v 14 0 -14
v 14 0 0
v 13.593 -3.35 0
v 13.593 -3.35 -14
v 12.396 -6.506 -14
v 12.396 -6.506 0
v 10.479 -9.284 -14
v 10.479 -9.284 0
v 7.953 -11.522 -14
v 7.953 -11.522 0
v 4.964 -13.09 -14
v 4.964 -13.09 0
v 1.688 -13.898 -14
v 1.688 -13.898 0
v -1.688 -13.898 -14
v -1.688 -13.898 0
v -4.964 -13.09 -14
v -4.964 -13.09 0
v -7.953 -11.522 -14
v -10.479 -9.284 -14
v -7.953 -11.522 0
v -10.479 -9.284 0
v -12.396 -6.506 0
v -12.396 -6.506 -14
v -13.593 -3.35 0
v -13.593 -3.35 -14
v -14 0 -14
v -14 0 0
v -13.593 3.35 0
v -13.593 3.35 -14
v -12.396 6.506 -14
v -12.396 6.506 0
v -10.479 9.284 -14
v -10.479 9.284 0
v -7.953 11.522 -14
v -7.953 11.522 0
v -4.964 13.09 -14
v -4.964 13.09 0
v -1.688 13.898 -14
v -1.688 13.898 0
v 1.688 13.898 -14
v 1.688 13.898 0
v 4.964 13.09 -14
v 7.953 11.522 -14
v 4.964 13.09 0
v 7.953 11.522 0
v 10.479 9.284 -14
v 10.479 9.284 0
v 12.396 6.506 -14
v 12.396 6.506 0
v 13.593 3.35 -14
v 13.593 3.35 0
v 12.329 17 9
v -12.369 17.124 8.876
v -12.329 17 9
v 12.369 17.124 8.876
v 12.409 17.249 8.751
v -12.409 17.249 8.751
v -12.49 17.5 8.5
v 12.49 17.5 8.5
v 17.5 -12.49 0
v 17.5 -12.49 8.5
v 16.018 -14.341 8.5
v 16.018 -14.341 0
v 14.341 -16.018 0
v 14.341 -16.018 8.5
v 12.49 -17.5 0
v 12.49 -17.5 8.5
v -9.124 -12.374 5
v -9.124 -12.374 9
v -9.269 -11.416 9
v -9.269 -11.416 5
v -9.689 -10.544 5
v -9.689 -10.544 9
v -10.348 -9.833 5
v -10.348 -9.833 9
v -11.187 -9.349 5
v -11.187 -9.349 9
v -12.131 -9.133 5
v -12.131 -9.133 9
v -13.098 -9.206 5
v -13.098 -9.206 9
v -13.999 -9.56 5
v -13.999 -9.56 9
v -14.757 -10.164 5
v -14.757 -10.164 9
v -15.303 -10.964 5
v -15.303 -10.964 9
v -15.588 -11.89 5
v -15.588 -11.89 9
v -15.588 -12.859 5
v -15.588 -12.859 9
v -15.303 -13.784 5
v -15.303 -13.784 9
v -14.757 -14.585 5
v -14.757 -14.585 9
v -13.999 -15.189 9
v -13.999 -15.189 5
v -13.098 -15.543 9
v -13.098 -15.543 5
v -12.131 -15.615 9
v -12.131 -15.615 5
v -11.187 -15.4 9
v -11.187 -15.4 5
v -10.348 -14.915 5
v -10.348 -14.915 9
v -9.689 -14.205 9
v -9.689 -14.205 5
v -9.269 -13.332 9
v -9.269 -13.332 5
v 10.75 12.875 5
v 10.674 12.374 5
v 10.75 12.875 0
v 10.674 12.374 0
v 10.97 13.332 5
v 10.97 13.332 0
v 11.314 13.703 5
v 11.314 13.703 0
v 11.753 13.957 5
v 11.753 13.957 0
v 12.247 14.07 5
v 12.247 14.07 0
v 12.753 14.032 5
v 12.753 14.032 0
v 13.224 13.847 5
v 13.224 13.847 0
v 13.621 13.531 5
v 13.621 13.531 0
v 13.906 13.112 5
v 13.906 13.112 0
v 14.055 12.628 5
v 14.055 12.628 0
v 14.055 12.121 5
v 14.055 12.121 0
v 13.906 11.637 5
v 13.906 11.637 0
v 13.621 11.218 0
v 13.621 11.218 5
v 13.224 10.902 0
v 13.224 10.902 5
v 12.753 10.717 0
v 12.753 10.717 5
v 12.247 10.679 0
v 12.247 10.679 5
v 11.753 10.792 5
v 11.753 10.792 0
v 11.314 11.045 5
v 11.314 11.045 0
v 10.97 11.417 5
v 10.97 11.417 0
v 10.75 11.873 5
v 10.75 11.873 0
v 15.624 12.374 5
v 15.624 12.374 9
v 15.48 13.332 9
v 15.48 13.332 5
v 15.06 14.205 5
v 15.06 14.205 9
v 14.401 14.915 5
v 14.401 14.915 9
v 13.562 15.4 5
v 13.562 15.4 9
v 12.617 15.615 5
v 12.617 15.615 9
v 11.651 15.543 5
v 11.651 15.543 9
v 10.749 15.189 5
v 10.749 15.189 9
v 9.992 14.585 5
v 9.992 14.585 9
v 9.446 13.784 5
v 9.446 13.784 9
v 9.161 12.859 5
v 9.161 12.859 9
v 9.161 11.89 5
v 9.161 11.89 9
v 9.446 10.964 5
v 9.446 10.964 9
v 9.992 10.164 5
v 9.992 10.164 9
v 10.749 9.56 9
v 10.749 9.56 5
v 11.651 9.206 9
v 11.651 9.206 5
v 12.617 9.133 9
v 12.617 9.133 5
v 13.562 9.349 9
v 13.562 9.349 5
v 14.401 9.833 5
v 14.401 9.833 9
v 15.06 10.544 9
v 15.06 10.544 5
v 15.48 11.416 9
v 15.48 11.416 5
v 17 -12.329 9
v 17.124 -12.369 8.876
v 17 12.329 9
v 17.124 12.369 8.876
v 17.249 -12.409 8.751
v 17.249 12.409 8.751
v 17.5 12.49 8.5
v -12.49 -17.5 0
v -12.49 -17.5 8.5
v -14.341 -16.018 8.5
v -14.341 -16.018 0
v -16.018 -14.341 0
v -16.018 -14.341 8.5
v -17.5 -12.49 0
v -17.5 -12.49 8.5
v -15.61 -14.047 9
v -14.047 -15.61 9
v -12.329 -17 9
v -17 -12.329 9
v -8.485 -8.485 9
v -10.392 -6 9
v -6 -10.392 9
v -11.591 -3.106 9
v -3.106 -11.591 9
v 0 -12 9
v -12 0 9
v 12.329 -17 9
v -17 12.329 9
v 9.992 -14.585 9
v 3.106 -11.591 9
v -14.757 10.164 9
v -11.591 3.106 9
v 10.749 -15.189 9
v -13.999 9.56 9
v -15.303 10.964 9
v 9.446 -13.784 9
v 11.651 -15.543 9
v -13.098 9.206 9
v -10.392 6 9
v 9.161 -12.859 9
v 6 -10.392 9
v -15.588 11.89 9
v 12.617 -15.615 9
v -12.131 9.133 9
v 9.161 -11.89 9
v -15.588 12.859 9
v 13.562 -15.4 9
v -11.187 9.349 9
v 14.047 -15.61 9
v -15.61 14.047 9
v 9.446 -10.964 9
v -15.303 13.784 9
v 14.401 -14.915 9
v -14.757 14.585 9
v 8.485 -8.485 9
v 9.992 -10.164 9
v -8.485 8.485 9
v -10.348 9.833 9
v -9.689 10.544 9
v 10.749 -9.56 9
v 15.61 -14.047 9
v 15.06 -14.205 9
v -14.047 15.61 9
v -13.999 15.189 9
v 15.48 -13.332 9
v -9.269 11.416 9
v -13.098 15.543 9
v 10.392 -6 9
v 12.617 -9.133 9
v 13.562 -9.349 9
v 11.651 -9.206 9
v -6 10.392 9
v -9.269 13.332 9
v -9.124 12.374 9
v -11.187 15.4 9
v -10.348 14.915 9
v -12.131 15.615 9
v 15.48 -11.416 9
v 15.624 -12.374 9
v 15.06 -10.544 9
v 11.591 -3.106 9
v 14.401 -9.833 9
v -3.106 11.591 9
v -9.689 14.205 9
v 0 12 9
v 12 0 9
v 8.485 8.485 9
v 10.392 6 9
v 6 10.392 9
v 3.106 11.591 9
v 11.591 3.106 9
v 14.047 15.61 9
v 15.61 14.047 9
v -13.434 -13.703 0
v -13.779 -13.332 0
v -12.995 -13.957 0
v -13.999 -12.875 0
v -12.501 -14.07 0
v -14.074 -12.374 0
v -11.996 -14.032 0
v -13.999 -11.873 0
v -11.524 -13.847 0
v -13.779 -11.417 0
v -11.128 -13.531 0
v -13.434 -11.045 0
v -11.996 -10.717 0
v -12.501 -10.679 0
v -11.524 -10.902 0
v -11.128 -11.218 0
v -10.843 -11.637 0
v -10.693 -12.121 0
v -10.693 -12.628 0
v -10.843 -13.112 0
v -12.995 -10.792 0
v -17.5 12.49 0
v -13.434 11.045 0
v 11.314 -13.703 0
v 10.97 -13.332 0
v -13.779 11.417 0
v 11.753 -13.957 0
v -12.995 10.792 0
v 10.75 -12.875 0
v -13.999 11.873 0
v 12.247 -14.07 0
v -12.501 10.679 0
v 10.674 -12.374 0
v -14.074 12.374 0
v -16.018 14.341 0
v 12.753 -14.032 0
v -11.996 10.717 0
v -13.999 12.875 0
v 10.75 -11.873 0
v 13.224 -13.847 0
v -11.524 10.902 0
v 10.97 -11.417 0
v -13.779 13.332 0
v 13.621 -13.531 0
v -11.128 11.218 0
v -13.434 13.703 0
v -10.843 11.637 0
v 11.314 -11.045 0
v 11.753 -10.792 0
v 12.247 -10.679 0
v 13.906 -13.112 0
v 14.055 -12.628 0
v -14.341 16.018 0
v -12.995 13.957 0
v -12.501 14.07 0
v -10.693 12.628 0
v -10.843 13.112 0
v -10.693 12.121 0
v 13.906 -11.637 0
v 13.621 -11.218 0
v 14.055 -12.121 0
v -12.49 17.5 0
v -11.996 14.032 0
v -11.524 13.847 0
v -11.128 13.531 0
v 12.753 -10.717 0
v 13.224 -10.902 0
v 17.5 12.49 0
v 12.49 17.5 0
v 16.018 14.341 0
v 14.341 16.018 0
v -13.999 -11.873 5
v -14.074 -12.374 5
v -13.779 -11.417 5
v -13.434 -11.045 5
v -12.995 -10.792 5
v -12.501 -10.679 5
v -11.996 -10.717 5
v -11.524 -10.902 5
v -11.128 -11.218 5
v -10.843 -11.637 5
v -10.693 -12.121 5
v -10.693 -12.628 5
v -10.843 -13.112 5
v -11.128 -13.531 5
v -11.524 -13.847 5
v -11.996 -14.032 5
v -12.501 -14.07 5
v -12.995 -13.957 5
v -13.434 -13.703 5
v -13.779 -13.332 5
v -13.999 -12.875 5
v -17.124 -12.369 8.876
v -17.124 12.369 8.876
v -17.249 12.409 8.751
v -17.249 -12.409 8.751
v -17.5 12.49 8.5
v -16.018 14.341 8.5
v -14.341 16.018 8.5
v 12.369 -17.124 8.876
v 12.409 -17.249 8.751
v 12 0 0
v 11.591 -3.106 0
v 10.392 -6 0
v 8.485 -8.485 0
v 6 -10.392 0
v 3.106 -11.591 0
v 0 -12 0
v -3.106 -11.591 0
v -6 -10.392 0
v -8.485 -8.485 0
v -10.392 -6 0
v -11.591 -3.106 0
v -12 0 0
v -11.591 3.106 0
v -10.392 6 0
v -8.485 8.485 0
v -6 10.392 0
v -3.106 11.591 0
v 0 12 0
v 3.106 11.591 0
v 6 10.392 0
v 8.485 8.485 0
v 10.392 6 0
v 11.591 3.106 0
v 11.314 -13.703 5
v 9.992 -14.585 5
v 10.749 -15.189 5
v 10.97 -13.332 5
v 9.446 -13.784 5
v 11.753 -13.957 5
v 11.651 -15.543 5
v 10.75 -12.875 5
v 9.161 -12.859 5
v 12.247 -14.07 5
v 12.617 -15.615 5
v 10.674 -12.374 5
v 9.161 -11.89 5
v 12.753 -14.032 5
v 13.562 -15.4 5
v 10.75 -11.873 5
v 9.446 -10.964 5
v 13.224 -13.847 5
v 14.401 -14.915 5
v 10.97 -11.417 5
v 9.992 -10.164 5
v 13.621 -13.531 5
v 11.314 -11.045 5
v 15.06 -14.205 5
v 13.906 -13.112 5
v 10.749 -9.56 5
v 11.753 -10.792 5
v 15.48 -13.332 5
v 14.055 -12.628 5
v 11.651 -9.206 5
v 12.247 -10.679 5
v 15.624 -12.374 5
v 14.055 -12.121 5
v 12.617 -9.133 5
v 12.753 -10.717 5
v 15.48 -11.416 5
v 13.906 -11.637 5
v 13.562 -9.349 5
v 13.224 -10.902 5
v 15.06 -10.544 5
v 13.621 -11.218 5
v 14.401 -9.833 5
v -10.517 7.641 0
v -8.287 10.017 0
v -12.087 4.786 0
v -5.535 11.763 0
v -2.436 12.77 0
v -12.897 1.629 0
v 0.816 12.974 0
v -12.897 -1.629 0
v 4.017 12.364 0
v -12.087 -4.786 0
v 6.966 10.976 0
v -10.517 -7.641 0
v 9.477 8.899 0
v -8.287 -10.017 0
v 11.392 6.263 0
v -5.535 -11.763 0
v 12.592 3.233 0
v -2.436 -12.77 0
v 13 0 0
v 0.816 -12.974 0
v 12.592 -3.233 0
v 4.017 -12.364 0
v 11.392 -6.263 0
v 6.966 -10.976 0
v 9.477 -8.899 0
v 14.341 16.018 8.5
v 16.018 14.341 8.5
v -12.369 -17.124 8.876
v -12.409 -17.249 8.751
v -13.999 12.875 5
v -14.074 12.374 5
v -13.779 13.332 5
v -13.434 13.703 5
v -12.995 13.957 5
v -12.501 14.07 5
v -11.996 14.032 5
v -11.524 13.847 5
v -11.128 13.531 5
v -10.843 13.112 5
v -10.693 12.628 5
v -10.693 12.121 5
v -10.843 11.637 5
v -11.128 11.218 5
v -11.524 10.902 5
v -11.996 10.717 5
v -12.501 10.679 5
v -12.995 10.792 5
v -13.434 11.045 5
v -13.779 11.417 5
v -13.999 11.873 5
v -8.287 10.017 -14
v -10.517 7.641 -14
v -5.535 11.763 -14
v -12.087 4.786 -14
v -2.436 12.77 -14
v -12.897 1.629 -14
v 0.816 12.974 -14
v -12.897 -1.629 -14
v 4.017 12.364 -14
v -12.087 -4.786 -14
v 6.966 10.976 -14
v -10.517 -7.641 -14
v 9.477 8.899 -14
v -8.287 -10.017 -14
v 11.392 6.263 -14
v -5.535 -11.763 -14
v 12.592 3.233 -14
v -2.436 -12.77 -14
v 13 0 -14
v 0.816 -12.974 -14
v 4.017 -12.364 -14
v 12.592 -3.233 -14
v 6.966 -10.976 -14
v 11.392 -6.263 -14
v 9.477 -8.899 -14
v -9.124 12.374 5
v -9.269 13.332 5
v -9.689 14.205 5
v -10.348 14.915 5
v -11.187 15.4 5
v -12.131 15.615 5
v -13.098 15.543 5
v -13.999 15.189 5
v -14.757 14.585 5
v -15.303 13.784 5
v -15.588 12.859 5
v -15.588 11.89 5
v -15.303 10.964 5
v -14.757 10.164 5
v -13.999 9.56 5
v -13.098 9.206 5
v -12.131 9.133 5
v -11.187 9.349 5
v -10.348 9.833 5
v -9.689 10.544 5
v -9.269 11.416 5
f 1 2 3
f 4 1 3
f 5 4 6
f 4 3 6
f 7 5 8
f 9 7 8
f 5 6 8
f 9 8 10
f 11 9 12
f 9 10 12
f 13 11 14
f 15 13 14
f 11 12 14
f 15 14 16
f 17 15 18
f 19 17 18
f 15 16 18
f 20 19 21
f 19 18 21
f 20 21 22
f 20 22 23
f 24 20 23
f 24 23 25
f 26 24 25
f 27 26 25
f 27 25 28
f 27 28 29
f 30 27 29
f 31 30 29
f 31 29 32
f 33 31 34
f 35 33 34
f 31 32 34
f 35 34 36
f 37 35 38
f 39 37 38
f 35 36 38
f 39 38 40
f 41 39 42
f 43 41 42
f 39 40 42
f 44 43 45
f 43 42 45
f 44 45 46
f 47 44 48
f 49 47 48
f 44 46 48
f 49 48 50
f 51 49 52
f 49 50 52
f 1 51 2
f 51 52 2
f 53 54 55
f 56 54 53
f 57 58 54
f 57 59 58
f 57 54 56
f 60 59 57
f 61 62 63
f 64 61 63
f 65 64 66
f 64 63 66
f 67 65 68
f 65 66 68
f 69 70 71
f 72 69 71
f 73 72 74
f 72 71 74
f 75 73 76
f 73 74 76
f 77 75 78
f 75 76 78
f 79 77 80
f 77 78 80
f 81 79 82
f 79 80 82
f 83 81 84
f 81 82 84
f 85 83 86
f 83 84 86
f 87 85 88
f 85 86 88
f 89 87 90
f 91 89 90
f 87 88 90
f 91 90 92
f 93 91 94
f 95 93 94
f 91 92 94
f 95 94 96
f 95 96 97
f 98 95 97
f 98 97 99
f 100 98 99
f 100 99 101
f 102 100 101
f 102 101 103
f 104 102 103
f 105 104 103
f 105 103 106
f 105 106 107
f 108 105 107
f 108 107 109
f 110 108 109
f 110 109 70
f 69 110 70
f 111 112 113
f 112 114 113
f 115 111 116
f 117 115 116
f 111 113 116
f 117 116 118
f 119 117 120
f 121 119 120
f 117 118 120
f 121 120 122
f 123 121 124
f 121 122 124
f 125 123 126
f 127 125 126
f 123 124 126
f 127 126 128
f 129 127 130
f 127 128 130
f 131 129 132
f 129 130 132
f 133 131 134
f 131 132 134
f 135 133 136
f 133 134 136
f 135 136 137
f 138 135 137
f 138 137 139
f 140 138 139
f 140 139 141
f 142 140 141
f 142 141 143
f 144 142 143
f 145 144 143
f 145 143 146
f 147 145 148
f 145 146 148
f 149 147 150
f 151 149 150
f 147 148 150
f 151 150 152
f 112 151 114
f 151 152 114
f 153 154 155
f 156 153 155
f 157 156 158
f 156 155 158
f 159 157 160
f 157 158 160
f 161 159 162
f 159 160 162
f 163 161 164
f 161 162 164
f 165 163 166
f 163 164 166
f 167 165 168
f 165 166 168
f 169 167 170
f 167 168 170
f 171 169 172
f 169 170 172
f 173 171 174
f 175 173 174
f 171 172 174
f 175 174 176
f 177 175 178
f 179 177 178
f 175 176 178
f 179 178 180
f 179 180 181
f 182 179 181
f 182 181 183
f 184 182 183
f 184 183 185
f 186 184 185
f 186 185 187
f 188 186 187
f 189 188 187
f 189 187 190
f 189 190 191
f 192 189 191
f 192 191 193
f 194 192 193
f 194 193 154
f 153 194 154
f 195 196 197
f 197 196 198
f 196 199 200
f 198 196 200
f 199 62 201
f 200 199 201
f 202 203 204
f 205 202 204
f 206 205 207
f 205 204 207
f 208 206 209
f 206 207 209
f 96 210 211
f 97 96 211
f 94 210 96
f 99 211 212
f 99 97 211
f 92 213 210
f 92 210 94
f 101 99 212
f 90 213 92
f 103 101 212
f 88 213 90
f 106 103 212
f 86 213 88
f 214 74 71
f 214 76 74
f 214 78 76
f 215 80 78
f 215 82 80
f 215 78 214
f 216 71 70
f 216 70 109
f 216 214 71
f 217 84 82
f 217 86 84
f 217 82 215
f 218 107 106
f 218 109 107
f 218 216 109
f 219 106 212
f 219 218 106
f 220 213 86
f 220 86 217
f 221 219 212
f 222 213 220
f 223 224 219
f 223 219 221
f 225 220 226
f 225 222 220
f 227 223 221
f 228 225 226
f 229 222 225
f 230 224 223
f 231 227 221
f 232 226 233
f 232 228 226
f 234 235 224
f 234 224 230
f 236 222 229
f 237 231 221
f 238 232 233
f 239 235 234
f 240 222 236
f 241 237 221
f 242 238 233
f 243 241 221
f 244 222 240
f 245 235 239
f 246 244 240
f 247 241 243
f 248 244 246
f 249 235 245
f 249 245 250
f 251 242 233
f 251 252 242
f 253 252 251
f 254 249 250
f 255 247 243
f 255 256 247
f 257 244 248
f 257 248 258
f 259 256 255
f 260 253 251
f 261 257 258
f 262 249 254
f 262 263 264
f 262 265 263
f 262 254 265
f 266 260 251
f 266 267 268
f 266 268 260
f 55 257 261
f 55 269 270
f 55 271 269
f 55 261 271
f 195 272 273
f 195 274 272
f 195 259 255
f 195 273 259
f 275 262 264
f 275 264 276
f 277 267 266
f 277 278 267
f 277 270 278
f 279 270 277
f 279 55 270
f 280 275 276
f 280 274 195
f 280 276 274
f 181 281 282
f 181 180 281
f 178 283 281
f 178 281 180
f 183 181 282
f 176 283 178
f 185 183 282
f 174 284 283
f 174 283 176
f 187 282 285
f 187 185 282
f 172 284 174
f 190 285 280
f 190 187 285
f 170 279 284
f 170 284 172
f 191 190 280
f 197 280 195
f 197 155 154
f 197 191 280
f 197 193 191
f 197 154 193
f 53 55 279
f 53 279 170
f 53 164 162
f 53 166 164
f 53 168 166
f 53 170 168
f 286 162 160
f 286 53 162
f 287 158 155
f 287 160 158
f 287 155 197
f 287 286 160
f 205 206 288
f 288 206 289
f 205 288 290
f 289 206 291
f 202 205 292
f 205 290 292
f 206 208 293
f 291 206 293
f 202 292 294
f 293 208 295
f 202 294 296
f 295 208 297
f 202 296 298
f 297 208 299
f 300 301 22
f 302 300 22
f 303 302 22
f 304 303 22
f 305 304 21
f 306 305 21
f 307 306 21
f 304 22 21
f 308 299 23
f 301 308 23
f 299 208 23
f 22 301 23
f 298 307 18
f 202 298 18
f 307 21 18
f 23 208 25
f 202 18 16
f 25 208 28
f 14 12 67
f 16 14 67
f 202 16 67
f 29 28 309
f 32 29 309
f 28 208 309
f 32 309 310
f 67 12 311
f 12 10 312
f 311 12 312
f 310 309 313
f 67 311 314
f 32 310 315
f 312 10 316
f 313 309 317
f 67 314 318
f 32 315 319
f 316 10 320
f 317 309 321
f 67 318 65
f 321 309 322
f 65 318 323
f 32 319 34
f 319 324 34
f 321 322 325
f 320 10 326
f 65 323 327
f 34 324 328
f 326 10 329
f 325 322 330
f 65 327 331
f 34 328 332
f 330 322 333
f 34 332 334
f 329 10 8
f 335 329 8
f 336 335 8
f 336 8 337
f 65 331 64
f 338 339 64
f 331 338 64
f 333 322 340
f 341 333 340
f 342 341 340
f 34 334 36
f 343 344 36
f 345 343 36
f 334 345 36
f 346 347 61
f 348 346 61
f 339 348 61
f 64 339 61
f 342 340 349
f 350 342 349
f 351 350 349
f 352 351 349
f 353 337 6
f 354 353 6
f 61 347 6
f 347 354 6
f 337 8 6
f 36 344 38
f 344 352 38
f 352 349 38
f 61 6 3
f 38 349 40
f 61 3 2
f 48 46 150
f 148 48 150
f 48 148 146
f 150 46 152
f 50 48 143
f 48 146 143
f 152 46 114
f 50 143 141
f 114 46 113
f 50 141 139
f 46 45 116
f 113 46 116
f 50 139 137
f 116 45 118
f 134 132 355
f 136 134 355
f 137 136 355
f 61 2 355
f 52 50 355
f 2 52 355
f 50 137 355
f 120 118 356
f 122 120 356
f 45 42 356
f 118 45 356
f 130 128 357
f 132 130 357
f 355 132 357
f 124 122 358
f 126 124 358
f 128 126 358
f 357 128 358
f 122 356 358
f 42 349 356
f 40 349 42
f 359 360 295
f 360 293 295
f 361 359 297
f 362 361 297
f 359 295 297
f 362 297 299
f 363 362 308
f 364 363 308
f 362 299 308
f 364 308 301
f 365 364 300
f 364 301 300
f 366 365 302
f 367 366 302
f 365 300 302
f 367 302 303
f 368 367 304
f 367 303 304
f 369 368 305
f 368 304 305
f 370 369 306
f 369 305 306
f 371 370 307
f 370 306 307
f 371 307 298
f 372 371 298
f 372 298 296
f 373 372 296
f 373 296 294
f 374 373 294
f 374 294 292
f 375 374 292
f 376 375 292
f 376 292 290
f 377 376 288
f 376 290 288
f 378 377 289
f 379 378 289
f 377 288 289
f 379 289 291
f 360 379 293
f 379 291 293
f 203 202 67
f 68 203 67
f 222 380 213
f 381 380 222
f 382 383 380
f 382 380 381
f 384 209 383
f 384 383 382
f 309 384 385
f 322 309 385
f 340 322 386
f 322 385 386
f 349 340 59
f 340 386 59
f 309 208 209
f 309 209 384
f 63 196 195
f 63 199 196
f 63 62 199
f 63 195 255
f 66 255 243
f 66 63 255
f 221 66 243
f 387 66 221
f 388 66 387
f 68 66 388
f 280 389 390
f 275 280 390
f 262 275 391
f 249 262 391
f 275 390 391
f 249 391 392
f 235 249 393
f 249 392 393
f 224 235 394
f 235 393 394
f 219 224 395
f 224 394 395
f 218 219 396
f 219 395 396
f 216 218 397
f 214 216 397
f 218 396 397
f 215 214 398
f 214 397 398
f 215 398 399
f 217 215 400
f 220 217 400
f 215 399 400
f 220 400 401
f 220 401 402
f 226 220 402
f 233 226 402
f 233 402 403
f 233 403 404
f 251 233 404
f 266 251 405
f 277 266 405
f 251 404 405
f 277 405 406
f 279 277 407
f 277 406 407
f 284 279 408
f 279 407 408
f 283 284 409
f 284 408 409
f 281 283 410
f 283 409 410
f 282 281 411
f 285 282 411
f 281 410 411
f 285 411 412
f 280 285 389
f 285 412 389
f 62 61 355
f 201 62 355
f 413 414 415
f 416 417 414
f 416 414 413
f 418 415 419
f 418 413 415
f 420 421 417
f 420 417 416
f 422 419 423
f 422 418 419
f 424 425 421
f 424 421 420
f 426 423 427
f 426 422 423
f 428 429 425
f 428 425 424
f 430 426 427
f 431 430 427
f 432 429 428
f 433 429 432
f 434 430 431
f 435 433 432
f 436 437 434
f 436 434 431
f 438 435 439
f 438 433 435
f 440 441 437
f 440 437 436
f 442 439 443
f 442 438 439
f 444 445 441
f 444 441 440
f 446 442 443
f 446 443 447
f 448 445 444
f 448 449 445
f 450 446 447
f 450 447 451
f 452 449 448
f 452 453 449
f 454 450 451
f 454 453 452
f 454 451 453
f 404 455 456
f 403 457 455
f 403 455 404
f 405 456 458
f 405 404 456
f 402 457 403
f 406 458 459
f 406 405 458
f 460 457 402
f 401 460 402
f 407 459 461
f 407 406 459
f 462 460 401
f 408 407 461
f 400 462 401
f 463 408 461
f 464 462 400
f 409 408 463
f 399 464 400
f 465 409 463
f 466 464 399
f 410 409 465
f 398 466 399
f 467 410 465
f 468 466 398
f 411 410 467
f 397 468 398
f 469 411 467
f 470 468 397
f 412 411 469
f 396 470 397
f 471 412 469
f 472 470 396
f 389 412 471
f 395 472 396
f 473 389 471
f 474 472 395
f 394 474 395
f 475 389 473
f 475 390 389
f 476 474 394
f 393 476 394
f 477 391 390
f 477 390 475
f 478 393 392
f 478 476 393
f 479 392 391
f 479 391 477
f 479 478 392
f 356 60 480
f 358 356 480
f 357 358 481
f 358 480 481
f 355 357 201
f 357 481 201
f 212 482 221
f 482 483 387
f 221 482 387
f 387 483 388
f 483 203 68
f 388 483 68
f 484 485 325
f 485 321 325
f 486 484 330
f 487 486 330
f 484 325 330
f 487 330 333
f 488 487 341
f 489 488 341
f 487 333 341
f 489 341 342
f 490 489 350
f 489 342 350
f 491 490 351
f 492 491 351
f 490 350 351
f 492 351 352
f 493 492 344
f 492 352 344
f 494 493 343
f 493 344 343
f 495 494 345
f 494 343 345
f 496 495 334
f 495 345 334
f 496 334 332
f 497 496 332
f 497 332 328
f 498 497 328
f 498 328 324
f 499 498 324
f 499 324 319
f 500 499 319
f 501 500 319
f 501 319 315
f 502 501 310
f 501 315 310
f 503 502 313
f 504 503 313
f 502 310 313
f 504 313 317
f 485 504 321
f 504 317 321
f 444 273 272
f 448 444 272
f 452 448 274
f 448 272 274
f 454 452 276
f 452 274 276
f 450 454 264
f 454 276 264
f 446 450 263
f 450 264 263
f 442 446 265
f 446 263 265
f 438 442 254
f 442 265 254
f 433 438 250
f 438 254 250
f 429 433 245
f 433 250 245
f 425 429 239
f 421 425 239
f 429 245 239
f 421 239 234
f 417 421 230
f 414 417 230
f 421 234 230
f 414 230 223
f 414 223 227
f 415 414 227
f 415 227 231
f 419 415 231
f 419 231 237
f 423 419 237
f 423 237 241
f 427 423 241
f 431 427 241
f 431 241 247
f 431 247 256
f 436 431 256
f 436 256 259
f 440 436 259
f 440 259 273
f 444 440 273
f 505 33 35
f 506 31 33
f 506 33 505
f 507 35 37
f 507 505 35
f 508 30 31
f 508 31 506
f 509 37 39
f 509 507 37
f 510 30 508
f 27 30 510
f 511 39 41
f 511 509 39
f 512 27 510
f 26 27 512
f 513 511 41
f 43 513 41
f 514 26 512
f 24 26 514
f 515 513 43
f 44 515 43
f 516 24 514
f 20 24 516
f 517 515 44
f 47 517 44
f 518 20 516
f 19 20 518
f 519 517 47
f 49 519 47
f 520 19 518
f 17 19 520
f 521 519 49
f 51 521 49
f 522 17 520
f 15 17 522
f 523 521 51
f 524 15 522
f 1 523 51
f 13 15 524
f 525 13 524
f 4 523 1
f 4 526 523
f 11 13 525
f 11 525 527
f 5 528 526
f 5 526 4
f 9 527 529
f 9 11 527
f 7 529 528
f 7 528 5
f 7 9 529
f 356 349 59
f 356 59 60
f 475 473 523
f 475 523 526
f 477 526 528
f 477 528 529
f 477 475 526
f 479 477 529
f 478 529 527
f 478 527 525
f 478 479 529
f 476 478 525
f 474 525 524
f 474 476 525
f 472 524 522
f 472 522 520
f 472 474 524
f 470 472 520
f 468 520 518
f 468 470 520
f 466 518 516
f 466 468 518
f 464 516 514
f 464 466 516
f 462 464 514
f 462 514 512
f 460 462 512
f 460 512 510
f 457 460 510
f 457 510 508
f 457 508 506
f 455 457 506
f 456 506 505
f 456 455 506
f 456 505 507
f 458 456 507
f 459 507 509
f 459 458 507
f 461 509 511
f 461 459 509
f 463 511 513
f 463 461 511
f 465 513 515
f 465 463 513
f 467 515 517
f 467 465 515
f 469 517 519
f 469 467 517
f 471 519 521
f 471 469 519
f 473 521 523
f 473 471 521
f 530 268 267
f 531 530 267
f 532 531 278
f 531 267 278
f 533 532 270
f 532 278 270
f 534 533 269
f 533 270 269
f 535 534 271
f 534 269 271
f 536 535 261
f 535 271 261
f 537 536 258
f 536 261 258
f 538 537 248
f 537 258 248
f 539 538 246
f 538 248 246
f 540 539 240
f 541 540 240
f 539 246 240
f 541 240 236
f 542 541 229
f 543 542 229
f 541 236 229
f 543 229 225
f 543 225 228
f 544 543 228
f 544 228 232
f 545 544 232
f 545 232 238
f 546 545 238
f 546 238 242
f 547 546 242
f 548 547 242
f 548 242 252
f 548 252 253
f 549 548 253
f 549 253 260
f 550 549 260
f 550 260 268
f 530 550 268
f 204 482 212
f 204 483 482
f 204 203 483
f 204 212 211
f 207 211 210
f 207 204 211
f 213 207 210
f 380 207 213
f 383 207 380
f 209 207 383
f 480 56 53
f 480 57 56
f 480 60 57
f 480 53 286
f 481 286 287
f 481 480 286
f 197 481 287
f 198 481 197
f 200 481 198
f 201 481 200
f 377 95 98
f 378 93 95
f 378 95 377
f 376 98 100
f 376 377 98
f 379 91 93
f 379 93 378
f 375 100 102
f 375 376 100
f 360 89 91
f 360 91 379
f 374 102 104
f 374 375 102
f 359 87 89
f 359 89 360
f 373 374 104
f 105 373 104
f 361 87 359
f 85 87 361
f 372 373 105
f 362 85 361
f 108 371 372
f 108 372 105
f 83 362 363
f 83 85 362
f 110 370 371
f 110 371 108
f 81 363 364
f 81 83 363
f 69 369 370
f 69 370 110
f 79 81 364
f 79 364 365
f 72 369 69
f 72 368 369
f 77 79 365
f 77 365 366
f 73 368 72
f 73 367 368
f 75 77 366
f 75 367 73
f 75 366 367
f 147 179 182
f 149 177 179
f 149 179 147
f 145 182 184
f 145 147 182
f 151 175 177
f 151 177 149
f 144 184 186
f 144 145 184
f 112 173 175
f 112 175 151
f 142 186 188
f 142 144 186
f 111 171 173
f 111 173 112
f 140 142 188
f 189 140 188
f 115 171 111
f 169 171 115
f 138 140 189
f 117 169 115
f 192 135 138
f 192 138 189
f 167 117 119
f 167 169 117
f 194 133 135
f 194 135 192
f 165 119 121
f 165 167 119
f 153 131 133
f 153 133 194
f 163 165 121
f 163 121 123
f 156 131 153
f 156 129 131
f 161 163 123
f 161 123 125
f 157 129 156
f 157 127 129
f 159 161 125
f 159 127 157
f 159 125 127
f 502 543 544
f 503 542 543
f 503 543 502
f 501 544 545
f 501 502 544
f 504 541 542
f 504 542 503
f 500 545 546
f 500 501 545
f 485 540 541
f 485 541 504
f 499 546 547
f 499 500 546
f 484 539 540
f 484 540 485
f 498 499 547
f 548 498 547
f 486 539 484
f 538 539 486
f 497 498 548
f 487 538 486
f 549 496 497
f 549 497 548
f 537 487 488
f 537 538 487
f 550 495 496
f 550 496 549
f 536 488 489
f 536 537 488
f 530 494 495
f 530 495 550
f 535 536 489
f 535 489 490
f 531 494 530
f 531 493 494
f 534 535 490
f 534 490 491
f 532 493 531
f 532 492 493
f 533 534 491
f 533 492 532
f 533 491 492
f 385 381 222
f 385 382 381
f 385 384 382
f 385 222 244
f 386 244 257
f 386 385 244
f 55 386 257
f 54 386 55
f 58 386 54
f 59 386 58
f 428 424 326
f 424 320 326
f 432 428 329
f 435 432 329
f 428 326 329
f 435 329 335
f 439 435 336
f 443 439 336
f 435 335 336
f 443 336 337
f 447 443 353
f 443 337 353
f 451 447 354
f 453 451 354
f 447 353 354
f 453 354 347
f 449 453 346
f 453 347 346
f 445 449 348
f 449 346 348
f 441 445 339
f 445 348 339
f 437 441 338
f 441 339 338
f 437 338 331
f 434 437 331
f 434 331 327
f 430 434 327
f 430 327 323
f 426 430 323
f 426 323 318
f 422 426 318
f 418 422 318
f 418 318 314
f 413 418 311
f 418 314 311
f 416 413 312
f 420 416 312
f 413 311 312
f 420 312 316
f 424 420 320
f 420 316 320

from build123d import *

# Parameters (mm, degrees)
F0_W           = 35
F0_H           = 35
F1_DEPTH       = 9
F2_R           = 14
F2_R_2         = 13
F3_DEPTH       = 14
F4_DEPTH       = 9.001
F6_D           = 3.4
F6_CBORE_D     = 6.5
F6_CBORE_DEPTH = 4
F7_DEPTH       = 23.001
F8_R           = 14
F8_R_2         = 12
F9_DEPTH       = 9
F10_SIZE       = 0.5


with BuildPart() as f1:
    # F0 (on Top) → F1 (new body)
    with BuildSketch(Plane.XY):
        Rectangle(F0_W, F0_H)
    extrude(amount=F1_DEPTH)

    # F2 (on face) → F3 (join)
    with BuildSketch(Plane(origin=(0, 0, 0), x_dir=(1, 0, 0), z_dir=(0, 0, -1))):
        Circle(F2_R)
        Circle(F2_R_2, mode=Mode.SUBTRACT)
    extrude(amount=F3_DEPTH)

    # F4 (cut, through all): a face of the model
    f4_faces = [f1.faces().sort_by_distance(p)[0] for p in [
        (0, 0, 0),
    ]]
    extrude(f4_faces, amount=-F4_DEPTH, mode=Mode.SUBTRACT)

    # F6 (through all)
    with Locations(Plane.XY.offset(9)):
        with Locations((-12.3743686708, 12.3743686708), (12.3743686708, 12.3743686708), (-12.3743686708, -12.3743686708), (12.3743686708, -12.3743686708)):
            CounterBoreHole(F6_D / 2, F6_CBORE_D / 2, F6_CBORE_DEPTH)

    # F5 (on face) → F7 (cut, through all)
    with BuildSketch(Plane.XY.offset(9)):
        with BuildLine():
            ThreePointArc((12.4899959968, 17.5), (15.2027957955, 15.2027957955), (17.5, 12.4899959968))
            Line((17.5, 12.4899959968), (17.5, 17.5))
            Line((17.5, 17.5), (12.4899959968, 17.5))
        make_face()
        with BuildLine():
            ThreePointArc((-17.5, 12.4899959968), (-15.2027957955, 15.2027957955), (-12.4899959968, 17.5))
            Line((-12.4899959968, 17.5), (-17.5, 17.5))
            Line((-17.5, 17.5), (-17.5, 12.4899959968))
        make_face()
        with BuildLine():
            Line((-17.5, -17.5), (-12.4899959968, -17.5))
            ThreePointArc((-12.4899959968, -17.5), (-15.2027957955, -15.2027957955), (-17.5, -12.4899959968))
            Line((-17.5, -12.4899959968), (-17.5, -17.5))
        make_face()
        with BuildLine():
            Line((17.5, -17.5), (17.5, -12.4899959968))
            ThreePointArc((17.5, -12.4899959968), (15.2027957955, -15.2027957955), (12.4899959968, -17.5))
            Line((12.4899959968, -17.5), (17.5, -17.5))
        make_face()
    extrude(amount=-F7_DEPTH, mode=Mode.SUBTRACT)

    # F8 (on face) → F9 (join)
    with BuildSketch(Plane(origin=(0, 0, 0), x_dir=(1, 0, 0), z_dir=(0, 0, -1))):
        Circle(F8_R)
        Circle(F8_R_2, mode=Mode.SUBTRACT)
    extrude(amount=-F9_DEPTH)

    # F10
    f10_edges = [f1.edges().sort_by_distance(p)[0] for p in [
        (0, -17.5, 9),
        (-15.202796, -15.202796, 9),
        (0, 17.5, 9),
        (15.202796, 15.202796, 9),
        (17.5, 0, 9),
        (-15.202796, 15.202796, 9),
        (15.202796, -15.202796, 9),
        (-17.5, 0, 9),
    ]]
    chamfer(f10_edges, length=F10_SIZE)


solid = f1.part
